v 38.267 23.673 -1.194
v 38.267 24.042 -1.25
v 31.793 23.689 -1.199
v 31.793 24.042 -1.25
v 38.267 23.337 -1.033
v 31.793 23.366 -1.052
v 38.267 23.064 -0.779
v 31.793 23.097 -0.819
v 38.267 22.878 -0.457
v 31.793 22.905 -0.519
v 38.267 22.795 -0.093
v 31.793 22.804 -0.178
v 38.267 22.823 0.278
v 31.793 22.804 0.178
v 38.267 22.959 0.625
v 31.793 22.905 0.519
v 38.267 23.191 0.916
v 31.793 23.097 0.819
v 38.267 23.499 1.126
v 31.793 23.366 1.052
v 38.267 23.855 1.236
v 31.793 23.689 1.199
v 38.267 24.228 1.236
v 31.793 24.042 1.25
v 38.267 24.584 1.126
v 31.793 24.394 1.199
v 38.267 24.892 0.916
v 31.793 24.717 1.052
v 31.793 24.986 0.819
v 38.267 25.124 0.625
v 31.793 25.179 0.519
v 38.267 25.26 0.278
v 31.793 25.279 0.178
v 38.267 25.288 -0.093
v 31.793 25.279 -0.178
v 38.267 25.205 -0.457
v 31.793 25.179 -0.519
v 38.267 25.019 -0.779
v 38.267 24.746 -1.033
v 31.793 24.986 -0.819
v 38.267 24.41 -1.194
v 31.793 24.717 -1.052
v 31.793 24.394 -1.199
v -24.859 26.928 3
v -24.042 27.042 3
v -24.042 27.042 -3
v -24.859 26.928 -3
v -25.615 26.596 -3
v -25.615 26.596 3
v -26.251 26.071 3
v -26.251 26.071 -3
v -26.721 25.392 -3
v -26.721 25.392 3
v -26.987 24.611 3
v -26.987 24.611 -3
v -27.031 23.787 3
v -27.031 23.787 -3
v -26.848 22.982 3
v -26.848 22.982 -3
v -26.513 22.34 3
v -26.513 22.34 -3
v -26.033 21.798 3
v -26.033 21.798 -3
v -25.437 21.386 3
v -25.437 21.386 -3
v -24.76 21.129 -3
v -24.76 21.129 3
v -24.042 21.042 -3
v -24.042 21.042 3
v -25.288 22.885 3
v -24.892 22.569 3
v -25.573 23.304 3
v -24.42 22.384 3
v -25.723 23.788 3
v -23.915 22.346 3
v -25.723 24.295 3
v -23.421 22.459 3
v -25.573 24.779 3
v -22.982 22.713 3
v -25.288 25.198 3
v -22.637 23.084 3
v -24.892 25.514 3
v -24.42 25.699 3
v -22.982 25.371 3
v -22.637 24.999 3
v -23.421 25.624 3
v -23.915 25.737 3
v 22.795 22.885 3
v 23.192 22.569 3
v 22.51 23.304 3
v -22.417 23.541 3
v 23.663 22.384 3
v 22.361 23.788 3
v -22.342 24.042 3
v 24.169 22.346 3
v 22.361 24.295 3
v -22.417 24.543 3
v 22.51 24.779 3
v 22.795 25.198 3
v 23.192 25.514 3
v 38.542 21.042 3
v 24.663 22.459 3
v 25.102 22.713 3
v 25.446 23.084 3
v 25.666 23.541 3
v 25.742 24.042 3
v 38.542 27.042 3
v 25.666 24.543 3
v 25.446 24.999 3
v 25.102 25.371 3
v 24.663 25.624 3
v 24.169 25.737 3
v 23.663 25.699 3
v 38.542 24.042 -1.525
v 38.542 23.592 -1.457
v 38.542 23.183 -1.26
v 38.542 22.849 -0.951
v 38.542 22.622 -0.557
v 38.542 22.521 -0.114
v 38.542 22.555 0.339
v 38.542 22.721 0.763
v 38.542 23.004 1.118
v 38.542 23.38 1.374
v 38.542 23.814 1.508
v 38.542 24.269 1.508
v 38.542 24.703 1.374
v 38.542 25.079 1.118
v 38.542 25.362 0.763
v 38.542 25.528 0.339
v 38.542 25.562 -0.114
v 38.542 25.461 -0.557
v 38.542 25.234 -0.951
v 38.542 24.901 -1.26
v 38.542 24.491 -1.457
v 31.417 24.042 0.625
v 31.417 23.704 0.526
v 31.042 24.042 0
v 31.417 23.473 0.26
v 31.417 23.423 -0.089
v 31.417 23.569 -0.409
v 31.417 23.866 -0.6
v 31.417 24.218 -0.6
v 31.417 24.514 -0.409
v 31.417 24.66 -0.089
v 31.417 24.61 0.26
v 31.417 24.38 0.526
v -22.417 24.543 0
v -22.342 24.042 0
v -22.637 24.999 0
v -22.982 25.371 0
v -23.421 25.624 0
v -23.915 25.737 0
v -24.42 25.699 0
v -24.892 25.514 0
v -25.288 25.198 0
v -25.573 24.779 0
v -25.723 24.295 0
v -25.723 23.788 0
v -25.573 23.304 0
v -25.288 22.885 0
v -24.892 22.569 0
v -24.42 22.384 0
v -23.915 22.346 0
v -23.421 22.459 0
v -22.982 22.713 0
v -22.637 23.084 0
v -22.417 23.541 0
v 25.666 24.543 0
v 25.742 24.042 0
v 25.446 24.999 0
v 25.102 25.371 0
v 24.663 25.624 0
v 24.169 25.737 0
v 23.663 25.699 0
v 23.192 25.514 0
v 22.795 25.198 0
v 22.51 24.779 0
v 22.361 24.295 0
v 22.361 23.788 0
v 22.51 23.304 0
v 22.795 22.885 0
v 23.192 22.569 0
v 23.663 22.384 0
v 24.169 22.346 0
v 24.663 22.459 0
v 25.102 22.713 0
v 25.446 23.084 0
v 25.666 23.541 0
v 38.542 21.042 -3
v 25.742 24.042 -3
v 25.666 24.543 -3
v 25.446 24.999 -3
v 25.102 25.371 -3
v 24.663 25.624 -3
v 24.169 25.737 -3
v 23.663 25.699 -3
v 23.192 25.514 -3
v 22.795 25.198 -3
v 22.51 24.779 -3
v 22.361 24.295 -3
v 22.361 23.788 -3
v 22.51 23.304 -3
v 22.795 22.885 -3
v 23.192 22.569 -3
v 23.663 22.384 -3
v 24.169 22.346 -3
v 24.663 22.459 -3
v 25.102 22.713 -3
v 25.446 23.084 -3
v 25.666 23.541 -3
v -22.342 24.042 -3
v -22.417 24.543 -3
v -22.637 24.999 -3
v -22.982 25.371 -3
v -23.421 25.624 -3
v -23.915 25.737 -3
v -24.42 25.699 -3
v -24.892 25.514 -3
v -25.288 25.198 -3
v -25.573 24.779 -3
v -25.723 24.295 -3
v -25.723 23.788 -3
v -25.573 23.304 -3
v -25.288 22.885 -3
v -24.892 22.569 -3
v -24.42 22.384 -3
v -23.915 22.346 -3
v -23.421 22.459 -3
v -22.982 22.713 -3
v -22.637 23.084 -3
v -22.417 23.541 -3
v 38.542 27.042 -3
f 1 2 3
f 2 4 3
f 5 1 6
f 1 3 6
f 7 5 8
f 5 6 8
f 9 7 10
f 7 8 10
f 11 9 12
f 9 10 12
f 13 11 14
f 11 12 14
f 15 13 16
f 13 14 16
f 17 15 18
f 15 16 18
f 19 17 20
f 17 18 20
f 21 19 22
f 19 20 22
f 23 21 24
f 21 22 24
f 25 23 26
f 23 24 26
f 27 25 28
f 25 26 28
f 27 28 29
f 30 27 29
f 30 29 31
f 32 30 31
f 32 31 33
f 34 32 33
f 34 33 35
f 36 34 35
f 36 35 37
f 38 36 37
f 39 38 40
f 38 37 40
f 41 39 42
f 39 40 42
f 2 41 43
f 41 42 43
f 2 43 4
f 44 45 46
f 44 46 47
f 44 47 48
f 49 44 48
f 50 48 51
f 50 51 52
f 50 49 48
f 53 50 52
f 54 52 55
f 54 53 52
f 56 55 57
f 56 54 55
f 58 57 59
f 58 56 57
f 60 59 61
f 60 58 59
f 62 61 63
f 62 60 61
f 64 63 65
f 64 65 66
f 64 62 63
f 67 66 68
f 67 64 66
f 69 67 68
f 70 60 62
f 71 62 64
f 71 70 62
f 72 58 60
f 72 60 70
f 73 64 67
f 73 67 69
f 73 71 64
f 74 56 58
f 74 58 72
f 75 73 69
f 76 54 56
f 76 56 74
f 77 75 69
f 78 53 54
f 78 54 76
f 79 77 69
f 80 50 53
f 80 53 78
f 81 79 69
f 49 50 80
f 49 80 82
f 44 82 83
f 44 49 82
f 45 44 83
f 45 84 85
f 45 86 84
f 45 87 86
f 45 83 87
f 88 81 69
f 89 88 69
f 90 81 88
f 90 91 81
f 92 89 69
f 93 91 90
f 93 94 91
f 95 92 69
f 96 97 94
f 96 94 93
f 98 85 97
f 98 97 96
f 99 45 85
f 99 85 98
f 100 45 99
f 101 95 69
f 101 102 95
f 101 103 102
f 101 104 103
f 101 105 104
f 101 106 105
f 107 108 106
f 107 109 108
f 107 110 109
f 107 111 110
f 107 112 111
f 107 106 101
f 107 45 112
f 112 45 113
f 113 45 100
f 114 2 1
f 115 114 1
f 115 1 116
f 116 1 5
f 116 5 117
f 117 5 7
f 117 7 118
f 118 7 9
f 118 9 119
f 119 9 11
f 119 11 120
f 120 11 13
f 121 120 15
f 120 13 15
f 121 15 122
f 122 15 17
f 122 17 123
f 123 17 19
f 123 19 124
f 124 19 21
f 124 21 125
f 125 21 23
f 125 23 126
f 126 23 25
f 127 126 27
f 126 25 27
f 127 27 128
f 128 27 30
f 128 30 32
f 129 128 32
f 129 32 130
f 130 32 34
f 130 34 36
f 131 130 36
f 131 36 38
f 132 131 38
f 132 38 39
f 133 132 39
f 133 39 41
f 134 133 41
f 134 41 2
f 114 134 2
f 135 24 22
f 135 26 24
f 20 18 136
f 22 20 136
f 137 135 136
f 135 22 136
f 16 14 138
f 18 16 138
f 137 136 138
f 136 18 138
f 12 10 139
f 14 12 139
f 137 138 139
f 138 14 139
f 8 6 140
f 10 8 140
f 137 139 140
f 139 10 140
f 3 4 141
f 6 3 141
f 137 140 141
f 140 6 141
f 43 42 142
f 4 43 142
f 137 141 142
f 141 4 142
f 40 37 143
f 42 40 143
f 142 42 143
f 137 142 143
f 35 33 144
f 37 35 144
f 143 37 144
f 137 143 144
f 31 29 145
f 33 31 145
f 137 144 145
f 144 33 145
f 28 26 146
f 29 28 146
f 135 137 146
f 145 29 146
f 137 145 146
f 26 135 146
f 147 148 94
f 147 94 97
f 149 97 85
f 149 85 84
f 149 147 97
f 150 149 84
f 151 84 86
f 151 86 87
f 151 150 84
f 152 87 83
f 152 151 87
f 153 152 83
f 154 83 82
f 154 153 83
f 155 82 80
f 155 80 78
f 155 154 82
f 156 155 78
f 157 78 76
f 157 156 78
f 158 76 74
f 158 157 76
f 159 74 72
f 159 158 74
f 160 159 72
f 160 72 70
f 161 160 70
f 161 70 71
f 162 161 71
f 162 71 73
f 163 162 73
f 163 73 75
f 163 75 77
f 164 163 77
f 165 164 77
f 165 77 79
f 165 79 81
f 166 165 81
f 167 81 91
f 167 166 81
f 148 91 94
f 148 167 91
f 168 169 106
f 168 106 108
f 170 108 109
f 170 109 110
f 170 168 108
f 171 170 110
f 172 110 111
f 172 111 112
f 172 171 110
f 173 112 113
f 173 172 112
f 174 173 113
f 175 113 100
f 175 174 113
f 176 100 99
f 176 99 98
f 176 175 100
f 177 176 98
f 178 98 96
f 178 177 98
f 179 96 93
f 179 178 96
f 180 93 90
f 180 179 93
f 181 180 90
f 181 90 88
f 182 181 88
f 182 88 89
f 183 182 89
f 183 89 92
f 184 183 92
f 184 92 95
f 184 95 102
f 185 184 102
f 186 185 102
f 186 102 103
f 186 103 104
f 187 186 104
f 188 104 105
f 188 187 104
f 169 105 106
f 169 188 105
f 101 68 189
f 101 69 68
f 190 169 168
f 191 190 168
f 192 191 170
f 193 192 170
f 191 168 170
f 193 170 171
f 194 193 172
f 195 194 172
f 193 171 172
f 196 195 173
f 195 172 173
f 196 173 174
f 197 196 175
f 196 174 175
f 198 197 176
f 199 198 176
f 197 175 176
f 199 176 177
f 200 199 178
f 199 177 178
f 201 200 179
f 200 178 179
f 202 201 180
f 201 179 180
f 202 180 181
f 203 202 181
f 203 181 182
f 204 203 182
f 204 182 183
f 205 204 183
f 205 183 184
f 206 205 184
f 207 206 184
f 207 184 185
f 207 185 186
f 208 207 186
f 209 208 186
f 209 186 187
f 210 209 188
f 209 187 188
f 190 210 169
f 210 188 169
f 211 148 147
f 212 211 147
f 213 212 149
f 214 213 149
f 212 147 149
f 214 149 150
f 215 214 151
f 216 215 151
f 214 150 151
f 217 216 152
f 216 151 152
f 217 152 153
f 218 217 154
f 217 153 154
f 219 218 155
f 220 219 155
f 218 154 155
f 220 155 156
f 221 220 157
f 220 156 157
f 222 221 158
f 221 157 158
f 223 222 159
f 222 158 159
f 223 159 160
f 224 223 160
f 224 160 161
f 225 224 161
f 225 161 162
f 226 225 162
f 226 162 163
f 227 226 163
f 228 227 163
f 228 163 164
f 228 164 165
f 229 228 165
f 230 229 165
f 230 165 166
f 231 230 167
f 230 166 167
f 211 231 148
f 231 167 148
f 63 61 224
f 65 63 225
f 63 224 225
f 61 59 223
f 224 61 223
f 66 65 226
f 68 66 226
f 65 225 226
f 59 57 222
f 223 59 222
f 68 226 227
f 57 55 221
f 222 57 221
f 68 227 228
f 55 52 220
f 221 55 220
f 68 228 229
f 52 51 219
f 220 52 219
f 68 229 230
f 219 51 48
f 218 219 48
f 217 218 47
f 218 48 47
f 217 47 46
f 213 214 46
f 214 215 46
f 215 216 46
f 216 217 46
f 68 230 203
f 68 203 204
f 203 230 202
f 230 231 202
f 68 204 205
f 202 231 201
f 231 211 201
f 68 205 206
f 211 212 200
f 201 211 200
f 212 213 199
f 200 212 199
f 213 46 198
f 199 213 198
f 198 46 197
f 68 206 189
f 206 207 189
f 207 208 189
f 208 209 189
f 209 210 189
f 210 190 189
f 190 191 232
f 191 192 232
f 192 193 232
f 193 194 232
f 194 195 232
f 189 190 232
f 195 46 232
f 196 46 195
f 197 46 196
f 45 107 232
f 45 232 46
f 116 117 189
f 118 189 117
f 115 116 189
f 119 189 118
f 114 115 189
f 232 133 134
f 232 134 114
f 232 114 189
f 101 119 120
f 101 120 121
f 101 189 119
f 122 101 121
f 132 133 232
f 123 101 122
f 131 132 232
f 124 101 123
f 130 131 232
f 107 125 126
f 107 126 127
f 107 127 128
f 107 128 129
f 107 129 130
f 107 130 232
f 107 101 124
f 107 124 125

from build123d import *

# Parameters (mm, degrees)
SKETCH1_R                       = 1.7
BOSS_EXTRUDE1_DEPTH             = 3
M3X0_5_TAPPED_HOLE1_D           = 2.5
M3X0_5_TAPPED_HOLE1_DEPTH       = 6.748924226
M3X0_5_TAPPED_HOLE1_CSINK_D     = 3.05
M3X0_5_TAPPED_HOLE1_CSINK_ANGLE = 90
M3X0_5_TAPPED_HOLE1_TIP         = 0.751075774


with BuildPart() as part:
    # Sketch1 → Boss-Extrude1 (new body, symmetric)
    with BuildSketch(Plane.XY):
        with BuildLine():
            Line((38.54163056, 21.04163056), (38.54163056, 27.04163056))
            Line((38.54163056, 27.04163056), (24.04163056, 27.04163056))
            ThreePointArc((24.04163056, 27.04163056), (26.509317815, 25.747655066), (26.848253846, 22.981976969))
            ThreePointArc((26.848253846, 22.981976969), (26.592295747, 22.027653458), (26.528996798, 21.04163056))
            Line((26.528996798, 21.04163056), (38.54163056, 21.04163056))
        make_face()
        with BuildLine():
            ThreePointArc((26.848253846, 22.981976969), (26.509317815, 25.747655066), (24.04163056, 27.04163056))
            ThreePointArc((24.04163056, 27.04163056), (23.503053666, 26.992890449), (22.981976969, 26.848253846))
            ThreePointArc((22.981976969, 26.848253846), (20.97309248, 26.531857751), (19.004373338, 27.04163056))
            Line((19.004373338, 27.04163056), (-19.004373338, 27.04163056))
            ThreePointArc((-19.004373338, 27.04163056), (-20.97309248, 26.531857751), (-22.981976969, 26.848253846))
            ThreePointArc((-22.981976969, 26.848253846), (-23.503053666, 26.992890449), (-24.04163056, 27.04163056))
            ThreePointArc((-24.04163056, 27.04163056), (-26.509317815, 25.747655066), (-26.848253846, 22.981976969))
            ThreePointArc((-26.848253846, 22.981976969), (-25.747655066, 21.573943306), (-24.04163056, 21.04163056))
            Line((-24.04163056, 21.04163056), (26.528996798, 21.04163056))
            ThreePointArc((26.528996798, 21.04163056), (26.592295747, 22.027653458), (26.848253846, 22.981976969))
        make_face()
        with Locations((-24.04163056, 24.04163056)):
            Circle(SKETCH1_R, mode=Mode.SUBTRACT)
        with Locations((24.04163056, 24.04163056)):
            Circle(SKETCH1_R, mode=Mode.SUBTRACT)
        with BuildLine():
            ThreePointArc((22.981976969, 26.848253846), (23.503053666, 26.992890449), (24.04163056, 27.04163056))
            Line((24.04163056, 27.04163056), (19.004373338, 27.04163056))
            ThreePointArc((19.004373338, 27.04163056), (20.97309248, 26.531857751), (22.981976969, 26.848253846))
        make_face()
        with BuildLine():
            ThreePointArc((-22.981976969, 26.848253846), (-20.97309248, 26.531857751), (-19.004373338, 27.04163056))
            Line((-19.004373338, 27.04163056), (-24.04163056, 27.04163056))
            ThreePointArc((-24.04163056, 27.04163056), (-23.503053666, 26.992890449), (-22.981976969, 26.848253846))
        make_face()
    extrude(amount=BOSS_EXTRUDE1_DEPTH, both=True)

    # M3x0.5 Tapped Hole1
    with Locations(Plane(origin=(38.54163056, 24.04163056, 0), x_dir=(0, 0, 1), z_dir=(1, 0, 0))):
        with Locations((0, 0)):
            CounterSinkHole(M3X0_5_TAPPED_HOLE1_D / 2, M3X0_5_TAPPED_HOLE1_CSINK_D / 2, depth=M3X0_5_TAPPED_HOLE1_DEPTH, counter_sink_angle=M3X0_5_TAPPED_HOLE1_CSINK_ANGLE)
            with Locations((0, 0, -(M3X0_5_TAPPED_HOLE1_DEPTH + M3X0_5_TAPPED_HOLE1_TIP / 2))):  # 118° drill point
                Cone(0, M3X0_5_TAPPED_HOLE1_D / 2, M3X0_5_TAPPED_HOLE1_TIP, mode=Mode.SUBTRACT)


solid = part.part
